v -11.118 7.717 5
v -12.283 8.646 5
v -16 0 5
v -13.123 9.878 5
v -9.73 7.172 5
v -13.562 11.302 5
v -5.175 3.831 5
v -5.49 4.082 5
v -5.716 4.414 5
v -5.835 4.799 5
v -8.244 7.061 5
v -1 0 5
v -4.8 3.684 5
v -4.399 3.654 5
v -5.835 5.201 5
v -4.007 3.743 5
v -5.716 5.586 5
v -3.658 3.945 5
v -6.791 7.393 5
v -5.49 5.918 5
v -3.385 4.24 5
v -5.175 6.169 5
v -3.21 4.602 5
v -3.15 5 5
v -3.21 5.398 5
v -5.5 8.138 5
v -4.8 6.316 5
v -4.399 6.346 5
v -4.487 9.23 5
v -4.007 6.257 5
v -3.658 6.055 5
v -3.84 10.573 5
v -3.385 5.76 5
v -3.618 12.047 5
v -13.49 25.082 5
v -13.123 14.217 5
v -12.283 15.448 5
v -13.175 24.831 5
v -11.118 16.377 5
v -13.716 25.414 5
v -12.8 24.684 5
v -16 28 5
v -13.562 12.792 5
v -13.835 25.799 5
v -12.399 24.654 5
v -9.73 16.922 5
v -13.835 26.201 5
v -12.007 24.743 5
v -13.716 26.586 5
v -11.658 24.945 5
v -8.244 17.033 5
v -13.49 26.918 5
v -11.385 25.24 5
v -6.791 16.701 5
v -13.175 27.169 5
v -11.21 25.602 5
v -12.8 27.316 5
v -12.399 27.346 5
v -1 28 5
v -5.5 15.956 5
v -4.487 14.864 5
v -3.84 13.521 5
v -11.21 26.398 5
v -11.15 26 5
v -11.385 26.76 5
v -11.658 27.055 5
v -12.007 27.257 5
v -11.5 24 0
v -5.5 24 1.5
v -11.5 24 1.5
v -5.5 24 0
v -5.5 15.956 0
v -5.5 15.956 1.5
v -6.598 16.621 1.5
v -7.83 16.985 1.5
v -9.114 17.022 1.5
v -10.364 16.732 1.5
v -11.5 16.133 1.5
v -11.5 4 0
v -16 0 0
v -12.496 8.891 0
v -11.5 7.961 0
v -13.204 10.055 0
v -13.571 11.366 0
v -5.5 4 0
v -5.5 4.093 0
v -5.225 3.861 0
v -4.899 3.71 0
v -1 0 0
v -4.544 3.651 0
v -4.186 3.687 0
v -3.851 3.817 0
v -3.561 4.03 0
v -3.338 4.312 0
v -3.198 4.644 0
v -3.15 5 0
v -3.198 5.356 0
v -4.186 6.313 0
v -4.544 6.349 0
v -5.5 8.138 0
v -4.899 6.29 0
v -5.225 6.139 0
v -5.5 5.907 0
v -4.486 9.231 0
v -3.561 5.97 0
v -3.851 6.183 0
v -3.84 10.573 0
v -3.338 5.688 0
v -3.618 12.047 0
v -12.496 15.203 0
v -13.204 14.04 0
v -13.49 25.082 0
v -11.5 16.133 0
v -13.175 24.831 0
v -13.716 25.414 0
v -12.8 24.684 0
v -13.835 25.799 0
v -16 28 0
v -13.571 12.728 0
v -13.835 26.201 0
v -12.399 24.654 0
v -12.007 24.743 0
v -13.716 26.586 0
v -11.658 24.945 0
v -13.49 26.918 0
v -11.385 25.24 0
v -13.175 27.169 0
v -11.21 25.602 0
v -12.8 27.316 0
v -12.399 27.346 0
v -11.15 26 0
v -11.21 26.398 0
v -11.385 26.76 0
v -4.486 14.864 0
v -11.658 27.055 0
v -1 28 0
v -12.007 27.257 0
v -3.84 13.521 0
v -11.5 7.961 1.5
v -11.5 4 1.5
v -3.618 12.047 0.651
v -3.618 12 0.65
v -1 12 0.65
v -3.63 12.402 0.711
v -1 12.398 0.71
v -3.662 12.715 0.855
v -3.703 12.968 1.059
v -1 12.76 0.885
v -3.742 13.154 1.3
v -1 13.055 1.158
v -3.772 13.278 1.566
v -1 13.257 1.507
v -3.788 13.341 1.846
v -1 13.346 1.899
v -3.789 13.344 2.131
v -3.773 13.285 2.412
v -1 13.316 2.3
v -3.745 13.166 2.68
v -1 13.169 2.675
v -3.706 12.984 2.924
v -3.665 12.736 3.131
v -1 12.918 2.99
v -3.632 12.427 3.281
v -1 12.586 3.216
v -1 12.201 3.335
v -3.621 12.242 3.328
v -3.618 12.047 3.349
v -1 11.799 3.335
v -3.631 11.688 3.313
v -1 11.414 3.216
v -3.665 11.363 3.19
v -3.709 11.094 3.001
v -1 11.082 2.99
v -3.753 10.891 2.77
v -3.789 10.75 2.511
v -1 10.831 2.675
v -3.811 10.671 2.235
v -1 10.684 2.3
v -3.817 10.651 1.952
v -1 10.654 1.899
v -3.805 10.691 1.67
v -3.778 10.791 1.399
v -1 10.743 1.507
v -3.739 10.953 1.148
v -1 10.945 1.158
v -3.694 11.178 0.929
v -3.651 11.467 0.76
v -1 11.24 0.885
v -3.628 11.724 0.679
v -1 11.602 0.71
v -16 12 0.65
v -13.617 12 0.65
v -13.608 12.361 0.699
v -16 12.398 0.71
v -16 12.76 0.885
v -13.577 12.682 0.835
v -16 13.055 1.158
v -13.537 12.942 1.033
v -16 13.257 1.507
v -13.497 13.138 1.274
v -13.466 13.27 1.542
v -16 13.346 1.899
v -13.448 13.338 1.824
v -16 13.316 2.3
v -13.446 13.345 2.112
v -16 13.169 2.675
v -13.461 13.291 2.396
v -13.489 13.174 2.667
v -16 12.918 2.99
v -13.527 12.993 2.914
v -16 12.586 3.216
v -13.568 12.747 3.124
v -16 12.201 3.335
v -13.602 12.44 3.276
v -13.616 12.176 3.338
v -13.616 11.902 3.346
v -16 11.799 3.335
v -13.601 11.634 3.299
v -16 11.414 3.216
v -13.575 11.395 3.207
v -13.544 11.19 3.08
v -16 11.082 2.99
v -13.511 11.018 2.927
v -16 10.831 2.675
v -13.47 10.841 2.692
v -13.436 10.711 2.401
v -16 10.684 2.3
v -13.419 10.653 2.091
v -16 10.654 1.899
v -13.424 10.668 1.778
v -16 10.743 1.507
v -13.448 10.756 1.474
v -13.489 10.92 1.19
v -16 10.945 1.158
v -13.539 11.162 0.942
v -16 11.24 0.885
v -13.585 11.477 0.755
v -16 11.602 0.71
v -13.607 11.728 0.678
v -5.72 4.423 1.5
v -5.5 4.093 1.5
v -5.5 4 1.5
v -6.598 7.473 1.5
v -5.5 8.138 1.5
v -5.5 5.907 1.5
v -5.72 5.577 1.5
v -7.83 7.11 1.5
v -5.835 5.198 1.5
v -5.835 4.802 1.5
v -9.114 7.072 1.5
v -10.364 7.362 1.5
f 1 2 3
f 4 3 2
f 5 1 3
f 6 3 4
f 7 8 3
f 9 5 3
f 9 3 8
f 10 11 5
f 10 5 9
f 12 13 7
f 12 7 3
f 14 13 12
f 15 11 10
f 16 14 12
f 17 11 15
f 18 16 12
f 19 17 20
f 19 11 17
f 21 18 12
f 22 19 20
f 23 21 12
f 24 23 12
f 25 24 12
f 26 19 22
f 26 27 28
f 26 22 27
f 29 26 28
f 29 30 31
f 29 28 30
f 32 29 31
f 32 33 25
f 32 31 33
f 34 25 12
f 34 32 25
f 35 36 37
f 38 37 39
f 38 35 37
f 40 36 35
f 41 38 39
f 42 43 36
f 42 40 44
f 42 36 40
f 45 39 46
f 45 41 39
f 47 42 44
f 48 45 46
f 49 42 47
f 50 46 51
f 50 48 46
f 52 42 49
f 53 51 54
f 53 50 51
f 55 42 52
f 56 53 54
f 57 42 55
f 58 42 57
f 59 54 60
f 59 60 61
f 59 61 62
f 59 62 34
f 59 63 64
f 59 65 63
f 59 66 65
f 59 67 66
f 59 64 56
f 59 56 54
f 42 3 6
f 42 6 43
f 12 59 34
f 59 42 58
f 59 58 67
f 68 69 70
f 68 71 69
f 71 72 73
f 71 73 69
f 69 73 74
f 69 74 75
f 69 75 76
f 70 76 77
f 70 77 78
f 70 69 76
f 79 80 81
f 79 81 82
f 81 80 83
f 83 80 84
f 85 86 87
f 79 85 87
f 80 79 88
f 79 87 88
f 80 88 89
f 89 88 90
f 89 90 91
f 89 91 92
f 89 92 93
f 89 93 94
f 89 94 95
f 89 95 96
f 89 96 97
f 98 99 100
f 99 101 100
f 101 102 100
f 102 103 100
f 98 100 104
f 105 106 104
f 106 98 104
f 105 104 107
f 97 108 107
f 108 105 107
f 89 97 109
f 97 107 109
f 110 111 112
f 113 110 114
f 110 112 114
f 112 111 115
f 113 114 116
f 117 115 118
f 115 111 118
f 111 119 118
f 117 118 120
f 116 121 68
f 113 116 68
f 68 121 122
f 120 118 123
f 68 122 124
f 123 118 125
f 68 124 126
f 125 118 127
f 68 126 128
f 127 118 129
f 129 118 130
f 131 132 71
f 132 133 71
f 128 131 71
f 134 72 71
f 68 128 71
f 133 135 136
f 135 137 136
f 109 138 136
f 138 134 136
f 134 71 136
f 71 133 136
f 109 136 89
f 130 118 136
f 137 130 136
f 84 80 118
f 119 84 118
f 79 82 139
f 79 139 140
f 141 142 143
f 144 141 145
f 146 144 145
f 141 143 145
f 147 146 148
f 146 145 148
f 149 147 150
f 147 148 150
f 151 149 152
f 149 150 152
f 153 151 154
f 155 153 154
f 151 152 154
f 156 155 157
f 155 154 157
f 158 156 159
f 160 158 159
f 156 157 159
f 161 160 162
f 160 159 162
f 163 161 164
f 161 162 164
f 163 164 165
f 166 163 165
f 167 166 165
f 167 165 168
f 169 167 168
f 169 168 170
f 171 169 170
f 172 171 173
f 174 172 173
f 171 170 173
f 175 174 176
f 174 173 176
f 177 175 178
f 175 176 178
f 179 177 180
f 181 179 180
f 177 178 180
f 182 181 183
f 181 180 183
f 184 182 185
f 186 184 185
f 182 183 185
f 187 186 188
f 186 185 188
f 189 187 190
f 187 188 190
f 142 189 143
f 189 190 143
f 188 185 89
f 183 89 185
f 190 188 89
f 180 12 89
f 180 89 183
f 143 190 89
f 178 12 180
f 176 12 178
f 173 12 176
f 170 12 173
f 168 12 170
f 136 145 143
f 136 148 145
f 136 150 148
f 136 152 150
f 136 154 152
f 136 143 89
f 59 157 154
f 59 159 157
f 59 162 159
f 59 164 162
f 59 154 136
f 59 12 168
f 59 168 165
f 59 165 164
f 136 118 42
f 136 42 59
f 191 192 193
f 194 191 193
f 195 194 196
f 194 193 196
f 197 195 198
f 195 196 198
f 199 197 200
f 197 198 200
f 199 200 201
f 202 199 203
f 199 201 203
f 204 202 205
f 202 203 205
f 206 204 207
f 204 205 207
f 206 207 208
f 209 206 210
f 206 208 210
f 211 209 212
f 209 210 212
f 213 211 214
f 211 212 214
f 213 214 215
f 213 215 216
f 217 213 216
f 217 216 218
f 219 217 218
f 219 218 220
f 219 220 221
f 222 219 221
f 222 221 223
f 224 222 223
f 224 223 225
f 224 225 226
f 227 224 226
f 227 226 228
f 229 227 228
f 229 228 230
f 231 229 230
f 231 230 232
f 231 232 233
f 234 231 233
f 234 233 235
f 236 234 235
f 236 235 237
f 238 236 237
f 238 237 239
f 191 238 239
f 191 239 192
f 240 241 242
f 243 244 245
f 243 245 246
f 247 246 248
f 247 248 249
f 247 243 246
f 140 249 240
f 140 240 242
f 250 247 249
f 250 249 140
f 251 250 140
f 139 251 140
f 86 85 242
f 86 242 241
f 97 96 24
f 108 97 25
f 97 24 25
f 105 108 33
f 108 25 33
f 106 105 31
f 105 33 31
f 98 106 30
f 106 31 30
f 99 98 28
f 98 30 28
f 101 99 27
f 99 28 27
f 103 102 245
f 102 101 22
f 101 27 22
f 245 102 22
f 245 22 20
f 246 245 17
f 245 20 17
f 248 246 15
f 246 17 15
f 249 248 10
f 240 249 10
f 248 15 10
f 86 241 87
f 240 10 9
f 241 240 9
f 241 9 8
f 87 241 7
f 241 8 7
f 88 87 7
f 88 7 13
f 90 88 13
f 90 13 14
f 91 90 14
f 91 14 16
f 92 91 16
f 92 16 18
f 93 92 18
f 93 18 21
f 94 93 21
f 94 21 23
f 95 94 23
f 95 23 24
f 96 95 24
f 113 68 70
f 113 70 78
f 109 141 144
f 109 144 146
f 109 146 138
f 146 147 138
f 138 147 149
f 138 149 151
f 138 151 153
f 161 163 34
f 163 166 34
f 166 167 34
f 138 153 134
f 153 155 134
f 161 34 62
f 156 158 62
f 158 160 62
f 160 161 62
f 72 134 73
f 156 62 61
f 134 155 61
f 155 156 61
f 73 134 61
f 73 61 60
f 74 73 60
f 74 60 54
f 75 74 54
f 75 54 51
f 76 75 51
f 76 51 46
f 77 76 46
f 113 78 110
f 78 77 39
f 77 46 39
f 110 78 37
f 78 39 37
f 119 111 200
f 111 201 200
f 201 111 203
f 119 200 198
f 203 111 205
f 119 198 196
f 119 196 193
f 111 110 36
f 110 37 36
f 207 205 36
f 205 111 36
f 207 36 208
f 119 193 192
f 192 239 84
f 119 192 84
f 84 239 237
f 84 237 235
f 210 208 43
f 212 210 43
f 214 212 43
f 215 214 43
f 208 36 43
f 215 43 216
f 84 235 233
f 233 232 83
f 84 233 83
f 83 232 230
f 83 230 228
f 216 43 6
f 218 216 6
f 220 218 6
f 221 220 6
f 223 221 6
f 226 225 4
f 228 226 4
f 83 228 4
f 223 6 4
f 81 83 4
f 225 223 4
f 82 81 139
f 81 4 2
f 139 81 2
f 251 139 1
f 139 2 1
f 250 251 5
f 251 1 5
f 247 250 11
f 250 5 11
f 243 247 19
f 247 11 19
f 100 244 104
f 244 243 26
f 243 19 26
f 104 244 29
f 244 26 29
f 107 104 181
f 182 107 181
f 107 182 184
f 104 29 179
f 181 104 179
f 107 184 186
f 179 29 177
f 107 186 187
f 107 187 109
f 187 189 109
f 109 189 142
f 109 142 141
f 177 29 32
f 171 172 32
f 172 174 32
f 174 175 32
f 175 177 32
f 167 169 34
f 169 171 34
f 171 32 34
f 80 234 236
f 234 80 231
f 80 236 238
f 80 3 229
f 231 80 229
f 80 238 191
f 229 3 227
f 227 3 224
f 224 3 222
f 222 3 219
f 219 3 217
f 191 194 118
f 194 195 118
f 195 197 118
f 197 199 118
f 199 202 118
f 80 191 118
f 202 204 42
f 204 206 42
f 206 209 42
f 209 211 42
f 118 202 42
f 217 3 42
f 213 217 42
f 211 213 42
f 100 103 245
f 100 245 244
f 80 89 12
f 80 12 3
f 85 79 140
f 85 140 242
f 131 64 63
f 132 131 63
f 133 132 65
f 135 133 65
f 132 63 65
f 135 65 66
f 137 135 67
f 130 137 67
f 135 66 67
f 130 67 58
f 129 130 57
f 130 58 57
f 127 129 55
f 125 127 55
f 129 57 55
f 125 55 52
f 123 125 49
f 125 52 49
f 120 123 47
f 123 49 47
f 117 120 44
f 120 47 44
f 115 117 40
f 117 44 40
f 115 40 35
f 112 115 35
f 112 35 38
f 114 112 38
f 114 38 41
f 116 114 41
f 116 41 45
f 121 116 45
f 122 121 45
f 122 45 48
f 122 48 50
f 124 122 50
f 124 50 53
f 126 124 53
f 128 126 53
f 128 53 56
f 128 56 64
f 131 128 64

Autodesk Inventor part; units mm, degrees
ref_plane "YZ Plane" through (0, 0, 0) normal (1, 0, 0) x (0, 1, 0)
ref_plane "XZ Plane" through (0, 0, 0) normal (0, 1, 0) x (-1, 0, 0)
ref_plane "XY Plane" through (0, 0, 0) normal (0, 0, 1) x (1, 0, 0)
sketch "Sketch2" plane through (0, 0, 0) normal (0, 0, 1) x (1, 0, 0)
  line L0 (-17, 28) -> (0, 28)
  line L1 (0, 28) -> (0, 17)
  line L2 (0, 7) -> (0, 0)
  line L3 (0, 0) -> (-17, 0)
  line L4 (-17, 0) -> (-17, 7)
  line L5 (-17, 28) -> (-17, 17)
  line L6 (-17, 17) -> (-17, 7)
  line L7 (0, 17) -> (0, 7)
  dimension "d0" = 17
  dimension "d1" = 28
extrude "Extrusion1" add sketch "Sketch2" along normal blind 5
sketch "Sketch4" plane through (0, 0, 0) normal (0, 0, -1) x (-1, 0, 0)
  line L0 (17, 28) -> (0, 28) projected
  line L1 (0, 28) -> (0, 0) projected
  line L2 (0, 0) -> (17, 0) projected
  line L3 (17, 0) -> (17, 28) projected
  line L4 (0, 28) -> (17, 28) projected
  line L5 (11.5, 24) -> (11.5, 4)
  line L6 (11.5, 4) -> (5.5, 4)
  line L7 (5.5, 4) -> (5.5, 24)
  line L8 (5.5, 24) -> (11.5, 24)
  dimension "d15" = 6
  dimension "d17" = 5.5
  dimension "d30" = 20
  dimension "d31" = 4
extrude "Extrusion3" cut sketch "Sketch4" against normal blind 1.5 contours L5 L6 L7 L8
sketch "Sketch5" plane through (0, 0, 5) normal (0, 0, 1) x (1, 0, 0)
  line L0 (0, 28) -> (-17, 28) projected
  line L1 (-17, 28) -> (-17, 0) projected
  line L2 (-17, 0) -> (0, 0) projected
  line L3 (0, 0) -> (0, 28) projected
  line L4 (-21, 17) -> (4, 7)
  line L5 (-21.4753, 7) -> (4, 17)
  circle A0 centre (-8.6177, 12.0471) radius 5
  dimension "d20" = 10
  dimension "d21" = 12.0471
extrude "Extrusion4" cut sketch "Sketch5" against normal through all contours A0 L4 L5 | L5 L4 A0 | L4 L5 A0 | A0 L5 L4
sketch "Sketch6" plane through (0, 0, 5) normal (0, 0, 1) x (1, 0, 0)
  circle A0 centre (-8.6177, 12.0471) radius 5 projected
  line L0 (0, 28) -> (-17, 28) projected
  line L1 (-17, 28) -> (-17, 0) projected
  line L2 (-17, 0) -> (0, 0) projected
  line L3 (0, 0) -> (0, 28) projected
  circle A1 centre (-12.5, 26) radius 1.35
  dimension "d24" = 2.7
  dimension "d25" = 4.5
  dimension "d26" = 2
extrude "Extrusion5" cut sketch "Sketch6" against normal through all contours A1
sketch "Sketch7" plane through (0, 0, 5) normal (0, 0, 1) x (1, 0, 0)
  line L0 (0, 0) -> (0, 28) projected
  line L1 (-17, 0) -> (0, 0) projected
  circle A0 centre (-4.5, 5) radius 1.35
  point P0 (0, 7)
  dimension "d32" = 2.7
  dimension "d33" = 4.5
  dimension "d34" = 5
extrude "Extrusion6" cut sketch "Sketch7" against normal through all
sketch "Sketch8" plane through (0, 0, 0) normal (1, 0, 0) x (0, 0, -1)
  circle A0 centre (-2, 12) radius 1.35
  line L0 (-5, 0) -> (-5, 28) projected
  line L1 (0, 0) -> (-5, 0) projected
  point P0 (0, -7)
  dimension "d37" = 2.7
  dimension "d41" = 12
extrude "Extrusion8" cut sketch "Sketch8" against normal through all
sketch "Sketch9" plane through (0, 0, 5) normal (0, 0, 1) x (1, 0, 0)
  circle A0 centre (-4.5, 5) radius 1.35 projected
  circle A1 centre (-12.5, 26) radius 1.35 projected
  circle A2 centre (-8.6177, 12.0471) radius 5 projected
  line L0 (0, 28) -> (-17, 28) projected
  line L1 (-17, 28) -> (-17, 0) projected
  line L2 (-17, 0) -> (0, 0) projected
  line L3 (0, 0) -> (0, 28) projected
  line L4 (-17, 0) -> (-16, 0)
  line L5 (-16, 0) -> (-16, 28)
  line L6 (-16, 28) -> (-17, 28)
  line L7 (-17, 28) -> (-17, 0)
  line L8 (0, 0) -> (-1, 0)
  line L9 (-1, 0) -> (-1, 28)
  line L10 (-1, 28) -> (0, 28)
  line L11 (0, 28) -> (0, 0)
extrude "Extrusion9" cut sketch "Sketch9" against normal through all contours L3 L2 L9 L0 | L5 L2 L1 L0
properties part number "tapa0.2"
